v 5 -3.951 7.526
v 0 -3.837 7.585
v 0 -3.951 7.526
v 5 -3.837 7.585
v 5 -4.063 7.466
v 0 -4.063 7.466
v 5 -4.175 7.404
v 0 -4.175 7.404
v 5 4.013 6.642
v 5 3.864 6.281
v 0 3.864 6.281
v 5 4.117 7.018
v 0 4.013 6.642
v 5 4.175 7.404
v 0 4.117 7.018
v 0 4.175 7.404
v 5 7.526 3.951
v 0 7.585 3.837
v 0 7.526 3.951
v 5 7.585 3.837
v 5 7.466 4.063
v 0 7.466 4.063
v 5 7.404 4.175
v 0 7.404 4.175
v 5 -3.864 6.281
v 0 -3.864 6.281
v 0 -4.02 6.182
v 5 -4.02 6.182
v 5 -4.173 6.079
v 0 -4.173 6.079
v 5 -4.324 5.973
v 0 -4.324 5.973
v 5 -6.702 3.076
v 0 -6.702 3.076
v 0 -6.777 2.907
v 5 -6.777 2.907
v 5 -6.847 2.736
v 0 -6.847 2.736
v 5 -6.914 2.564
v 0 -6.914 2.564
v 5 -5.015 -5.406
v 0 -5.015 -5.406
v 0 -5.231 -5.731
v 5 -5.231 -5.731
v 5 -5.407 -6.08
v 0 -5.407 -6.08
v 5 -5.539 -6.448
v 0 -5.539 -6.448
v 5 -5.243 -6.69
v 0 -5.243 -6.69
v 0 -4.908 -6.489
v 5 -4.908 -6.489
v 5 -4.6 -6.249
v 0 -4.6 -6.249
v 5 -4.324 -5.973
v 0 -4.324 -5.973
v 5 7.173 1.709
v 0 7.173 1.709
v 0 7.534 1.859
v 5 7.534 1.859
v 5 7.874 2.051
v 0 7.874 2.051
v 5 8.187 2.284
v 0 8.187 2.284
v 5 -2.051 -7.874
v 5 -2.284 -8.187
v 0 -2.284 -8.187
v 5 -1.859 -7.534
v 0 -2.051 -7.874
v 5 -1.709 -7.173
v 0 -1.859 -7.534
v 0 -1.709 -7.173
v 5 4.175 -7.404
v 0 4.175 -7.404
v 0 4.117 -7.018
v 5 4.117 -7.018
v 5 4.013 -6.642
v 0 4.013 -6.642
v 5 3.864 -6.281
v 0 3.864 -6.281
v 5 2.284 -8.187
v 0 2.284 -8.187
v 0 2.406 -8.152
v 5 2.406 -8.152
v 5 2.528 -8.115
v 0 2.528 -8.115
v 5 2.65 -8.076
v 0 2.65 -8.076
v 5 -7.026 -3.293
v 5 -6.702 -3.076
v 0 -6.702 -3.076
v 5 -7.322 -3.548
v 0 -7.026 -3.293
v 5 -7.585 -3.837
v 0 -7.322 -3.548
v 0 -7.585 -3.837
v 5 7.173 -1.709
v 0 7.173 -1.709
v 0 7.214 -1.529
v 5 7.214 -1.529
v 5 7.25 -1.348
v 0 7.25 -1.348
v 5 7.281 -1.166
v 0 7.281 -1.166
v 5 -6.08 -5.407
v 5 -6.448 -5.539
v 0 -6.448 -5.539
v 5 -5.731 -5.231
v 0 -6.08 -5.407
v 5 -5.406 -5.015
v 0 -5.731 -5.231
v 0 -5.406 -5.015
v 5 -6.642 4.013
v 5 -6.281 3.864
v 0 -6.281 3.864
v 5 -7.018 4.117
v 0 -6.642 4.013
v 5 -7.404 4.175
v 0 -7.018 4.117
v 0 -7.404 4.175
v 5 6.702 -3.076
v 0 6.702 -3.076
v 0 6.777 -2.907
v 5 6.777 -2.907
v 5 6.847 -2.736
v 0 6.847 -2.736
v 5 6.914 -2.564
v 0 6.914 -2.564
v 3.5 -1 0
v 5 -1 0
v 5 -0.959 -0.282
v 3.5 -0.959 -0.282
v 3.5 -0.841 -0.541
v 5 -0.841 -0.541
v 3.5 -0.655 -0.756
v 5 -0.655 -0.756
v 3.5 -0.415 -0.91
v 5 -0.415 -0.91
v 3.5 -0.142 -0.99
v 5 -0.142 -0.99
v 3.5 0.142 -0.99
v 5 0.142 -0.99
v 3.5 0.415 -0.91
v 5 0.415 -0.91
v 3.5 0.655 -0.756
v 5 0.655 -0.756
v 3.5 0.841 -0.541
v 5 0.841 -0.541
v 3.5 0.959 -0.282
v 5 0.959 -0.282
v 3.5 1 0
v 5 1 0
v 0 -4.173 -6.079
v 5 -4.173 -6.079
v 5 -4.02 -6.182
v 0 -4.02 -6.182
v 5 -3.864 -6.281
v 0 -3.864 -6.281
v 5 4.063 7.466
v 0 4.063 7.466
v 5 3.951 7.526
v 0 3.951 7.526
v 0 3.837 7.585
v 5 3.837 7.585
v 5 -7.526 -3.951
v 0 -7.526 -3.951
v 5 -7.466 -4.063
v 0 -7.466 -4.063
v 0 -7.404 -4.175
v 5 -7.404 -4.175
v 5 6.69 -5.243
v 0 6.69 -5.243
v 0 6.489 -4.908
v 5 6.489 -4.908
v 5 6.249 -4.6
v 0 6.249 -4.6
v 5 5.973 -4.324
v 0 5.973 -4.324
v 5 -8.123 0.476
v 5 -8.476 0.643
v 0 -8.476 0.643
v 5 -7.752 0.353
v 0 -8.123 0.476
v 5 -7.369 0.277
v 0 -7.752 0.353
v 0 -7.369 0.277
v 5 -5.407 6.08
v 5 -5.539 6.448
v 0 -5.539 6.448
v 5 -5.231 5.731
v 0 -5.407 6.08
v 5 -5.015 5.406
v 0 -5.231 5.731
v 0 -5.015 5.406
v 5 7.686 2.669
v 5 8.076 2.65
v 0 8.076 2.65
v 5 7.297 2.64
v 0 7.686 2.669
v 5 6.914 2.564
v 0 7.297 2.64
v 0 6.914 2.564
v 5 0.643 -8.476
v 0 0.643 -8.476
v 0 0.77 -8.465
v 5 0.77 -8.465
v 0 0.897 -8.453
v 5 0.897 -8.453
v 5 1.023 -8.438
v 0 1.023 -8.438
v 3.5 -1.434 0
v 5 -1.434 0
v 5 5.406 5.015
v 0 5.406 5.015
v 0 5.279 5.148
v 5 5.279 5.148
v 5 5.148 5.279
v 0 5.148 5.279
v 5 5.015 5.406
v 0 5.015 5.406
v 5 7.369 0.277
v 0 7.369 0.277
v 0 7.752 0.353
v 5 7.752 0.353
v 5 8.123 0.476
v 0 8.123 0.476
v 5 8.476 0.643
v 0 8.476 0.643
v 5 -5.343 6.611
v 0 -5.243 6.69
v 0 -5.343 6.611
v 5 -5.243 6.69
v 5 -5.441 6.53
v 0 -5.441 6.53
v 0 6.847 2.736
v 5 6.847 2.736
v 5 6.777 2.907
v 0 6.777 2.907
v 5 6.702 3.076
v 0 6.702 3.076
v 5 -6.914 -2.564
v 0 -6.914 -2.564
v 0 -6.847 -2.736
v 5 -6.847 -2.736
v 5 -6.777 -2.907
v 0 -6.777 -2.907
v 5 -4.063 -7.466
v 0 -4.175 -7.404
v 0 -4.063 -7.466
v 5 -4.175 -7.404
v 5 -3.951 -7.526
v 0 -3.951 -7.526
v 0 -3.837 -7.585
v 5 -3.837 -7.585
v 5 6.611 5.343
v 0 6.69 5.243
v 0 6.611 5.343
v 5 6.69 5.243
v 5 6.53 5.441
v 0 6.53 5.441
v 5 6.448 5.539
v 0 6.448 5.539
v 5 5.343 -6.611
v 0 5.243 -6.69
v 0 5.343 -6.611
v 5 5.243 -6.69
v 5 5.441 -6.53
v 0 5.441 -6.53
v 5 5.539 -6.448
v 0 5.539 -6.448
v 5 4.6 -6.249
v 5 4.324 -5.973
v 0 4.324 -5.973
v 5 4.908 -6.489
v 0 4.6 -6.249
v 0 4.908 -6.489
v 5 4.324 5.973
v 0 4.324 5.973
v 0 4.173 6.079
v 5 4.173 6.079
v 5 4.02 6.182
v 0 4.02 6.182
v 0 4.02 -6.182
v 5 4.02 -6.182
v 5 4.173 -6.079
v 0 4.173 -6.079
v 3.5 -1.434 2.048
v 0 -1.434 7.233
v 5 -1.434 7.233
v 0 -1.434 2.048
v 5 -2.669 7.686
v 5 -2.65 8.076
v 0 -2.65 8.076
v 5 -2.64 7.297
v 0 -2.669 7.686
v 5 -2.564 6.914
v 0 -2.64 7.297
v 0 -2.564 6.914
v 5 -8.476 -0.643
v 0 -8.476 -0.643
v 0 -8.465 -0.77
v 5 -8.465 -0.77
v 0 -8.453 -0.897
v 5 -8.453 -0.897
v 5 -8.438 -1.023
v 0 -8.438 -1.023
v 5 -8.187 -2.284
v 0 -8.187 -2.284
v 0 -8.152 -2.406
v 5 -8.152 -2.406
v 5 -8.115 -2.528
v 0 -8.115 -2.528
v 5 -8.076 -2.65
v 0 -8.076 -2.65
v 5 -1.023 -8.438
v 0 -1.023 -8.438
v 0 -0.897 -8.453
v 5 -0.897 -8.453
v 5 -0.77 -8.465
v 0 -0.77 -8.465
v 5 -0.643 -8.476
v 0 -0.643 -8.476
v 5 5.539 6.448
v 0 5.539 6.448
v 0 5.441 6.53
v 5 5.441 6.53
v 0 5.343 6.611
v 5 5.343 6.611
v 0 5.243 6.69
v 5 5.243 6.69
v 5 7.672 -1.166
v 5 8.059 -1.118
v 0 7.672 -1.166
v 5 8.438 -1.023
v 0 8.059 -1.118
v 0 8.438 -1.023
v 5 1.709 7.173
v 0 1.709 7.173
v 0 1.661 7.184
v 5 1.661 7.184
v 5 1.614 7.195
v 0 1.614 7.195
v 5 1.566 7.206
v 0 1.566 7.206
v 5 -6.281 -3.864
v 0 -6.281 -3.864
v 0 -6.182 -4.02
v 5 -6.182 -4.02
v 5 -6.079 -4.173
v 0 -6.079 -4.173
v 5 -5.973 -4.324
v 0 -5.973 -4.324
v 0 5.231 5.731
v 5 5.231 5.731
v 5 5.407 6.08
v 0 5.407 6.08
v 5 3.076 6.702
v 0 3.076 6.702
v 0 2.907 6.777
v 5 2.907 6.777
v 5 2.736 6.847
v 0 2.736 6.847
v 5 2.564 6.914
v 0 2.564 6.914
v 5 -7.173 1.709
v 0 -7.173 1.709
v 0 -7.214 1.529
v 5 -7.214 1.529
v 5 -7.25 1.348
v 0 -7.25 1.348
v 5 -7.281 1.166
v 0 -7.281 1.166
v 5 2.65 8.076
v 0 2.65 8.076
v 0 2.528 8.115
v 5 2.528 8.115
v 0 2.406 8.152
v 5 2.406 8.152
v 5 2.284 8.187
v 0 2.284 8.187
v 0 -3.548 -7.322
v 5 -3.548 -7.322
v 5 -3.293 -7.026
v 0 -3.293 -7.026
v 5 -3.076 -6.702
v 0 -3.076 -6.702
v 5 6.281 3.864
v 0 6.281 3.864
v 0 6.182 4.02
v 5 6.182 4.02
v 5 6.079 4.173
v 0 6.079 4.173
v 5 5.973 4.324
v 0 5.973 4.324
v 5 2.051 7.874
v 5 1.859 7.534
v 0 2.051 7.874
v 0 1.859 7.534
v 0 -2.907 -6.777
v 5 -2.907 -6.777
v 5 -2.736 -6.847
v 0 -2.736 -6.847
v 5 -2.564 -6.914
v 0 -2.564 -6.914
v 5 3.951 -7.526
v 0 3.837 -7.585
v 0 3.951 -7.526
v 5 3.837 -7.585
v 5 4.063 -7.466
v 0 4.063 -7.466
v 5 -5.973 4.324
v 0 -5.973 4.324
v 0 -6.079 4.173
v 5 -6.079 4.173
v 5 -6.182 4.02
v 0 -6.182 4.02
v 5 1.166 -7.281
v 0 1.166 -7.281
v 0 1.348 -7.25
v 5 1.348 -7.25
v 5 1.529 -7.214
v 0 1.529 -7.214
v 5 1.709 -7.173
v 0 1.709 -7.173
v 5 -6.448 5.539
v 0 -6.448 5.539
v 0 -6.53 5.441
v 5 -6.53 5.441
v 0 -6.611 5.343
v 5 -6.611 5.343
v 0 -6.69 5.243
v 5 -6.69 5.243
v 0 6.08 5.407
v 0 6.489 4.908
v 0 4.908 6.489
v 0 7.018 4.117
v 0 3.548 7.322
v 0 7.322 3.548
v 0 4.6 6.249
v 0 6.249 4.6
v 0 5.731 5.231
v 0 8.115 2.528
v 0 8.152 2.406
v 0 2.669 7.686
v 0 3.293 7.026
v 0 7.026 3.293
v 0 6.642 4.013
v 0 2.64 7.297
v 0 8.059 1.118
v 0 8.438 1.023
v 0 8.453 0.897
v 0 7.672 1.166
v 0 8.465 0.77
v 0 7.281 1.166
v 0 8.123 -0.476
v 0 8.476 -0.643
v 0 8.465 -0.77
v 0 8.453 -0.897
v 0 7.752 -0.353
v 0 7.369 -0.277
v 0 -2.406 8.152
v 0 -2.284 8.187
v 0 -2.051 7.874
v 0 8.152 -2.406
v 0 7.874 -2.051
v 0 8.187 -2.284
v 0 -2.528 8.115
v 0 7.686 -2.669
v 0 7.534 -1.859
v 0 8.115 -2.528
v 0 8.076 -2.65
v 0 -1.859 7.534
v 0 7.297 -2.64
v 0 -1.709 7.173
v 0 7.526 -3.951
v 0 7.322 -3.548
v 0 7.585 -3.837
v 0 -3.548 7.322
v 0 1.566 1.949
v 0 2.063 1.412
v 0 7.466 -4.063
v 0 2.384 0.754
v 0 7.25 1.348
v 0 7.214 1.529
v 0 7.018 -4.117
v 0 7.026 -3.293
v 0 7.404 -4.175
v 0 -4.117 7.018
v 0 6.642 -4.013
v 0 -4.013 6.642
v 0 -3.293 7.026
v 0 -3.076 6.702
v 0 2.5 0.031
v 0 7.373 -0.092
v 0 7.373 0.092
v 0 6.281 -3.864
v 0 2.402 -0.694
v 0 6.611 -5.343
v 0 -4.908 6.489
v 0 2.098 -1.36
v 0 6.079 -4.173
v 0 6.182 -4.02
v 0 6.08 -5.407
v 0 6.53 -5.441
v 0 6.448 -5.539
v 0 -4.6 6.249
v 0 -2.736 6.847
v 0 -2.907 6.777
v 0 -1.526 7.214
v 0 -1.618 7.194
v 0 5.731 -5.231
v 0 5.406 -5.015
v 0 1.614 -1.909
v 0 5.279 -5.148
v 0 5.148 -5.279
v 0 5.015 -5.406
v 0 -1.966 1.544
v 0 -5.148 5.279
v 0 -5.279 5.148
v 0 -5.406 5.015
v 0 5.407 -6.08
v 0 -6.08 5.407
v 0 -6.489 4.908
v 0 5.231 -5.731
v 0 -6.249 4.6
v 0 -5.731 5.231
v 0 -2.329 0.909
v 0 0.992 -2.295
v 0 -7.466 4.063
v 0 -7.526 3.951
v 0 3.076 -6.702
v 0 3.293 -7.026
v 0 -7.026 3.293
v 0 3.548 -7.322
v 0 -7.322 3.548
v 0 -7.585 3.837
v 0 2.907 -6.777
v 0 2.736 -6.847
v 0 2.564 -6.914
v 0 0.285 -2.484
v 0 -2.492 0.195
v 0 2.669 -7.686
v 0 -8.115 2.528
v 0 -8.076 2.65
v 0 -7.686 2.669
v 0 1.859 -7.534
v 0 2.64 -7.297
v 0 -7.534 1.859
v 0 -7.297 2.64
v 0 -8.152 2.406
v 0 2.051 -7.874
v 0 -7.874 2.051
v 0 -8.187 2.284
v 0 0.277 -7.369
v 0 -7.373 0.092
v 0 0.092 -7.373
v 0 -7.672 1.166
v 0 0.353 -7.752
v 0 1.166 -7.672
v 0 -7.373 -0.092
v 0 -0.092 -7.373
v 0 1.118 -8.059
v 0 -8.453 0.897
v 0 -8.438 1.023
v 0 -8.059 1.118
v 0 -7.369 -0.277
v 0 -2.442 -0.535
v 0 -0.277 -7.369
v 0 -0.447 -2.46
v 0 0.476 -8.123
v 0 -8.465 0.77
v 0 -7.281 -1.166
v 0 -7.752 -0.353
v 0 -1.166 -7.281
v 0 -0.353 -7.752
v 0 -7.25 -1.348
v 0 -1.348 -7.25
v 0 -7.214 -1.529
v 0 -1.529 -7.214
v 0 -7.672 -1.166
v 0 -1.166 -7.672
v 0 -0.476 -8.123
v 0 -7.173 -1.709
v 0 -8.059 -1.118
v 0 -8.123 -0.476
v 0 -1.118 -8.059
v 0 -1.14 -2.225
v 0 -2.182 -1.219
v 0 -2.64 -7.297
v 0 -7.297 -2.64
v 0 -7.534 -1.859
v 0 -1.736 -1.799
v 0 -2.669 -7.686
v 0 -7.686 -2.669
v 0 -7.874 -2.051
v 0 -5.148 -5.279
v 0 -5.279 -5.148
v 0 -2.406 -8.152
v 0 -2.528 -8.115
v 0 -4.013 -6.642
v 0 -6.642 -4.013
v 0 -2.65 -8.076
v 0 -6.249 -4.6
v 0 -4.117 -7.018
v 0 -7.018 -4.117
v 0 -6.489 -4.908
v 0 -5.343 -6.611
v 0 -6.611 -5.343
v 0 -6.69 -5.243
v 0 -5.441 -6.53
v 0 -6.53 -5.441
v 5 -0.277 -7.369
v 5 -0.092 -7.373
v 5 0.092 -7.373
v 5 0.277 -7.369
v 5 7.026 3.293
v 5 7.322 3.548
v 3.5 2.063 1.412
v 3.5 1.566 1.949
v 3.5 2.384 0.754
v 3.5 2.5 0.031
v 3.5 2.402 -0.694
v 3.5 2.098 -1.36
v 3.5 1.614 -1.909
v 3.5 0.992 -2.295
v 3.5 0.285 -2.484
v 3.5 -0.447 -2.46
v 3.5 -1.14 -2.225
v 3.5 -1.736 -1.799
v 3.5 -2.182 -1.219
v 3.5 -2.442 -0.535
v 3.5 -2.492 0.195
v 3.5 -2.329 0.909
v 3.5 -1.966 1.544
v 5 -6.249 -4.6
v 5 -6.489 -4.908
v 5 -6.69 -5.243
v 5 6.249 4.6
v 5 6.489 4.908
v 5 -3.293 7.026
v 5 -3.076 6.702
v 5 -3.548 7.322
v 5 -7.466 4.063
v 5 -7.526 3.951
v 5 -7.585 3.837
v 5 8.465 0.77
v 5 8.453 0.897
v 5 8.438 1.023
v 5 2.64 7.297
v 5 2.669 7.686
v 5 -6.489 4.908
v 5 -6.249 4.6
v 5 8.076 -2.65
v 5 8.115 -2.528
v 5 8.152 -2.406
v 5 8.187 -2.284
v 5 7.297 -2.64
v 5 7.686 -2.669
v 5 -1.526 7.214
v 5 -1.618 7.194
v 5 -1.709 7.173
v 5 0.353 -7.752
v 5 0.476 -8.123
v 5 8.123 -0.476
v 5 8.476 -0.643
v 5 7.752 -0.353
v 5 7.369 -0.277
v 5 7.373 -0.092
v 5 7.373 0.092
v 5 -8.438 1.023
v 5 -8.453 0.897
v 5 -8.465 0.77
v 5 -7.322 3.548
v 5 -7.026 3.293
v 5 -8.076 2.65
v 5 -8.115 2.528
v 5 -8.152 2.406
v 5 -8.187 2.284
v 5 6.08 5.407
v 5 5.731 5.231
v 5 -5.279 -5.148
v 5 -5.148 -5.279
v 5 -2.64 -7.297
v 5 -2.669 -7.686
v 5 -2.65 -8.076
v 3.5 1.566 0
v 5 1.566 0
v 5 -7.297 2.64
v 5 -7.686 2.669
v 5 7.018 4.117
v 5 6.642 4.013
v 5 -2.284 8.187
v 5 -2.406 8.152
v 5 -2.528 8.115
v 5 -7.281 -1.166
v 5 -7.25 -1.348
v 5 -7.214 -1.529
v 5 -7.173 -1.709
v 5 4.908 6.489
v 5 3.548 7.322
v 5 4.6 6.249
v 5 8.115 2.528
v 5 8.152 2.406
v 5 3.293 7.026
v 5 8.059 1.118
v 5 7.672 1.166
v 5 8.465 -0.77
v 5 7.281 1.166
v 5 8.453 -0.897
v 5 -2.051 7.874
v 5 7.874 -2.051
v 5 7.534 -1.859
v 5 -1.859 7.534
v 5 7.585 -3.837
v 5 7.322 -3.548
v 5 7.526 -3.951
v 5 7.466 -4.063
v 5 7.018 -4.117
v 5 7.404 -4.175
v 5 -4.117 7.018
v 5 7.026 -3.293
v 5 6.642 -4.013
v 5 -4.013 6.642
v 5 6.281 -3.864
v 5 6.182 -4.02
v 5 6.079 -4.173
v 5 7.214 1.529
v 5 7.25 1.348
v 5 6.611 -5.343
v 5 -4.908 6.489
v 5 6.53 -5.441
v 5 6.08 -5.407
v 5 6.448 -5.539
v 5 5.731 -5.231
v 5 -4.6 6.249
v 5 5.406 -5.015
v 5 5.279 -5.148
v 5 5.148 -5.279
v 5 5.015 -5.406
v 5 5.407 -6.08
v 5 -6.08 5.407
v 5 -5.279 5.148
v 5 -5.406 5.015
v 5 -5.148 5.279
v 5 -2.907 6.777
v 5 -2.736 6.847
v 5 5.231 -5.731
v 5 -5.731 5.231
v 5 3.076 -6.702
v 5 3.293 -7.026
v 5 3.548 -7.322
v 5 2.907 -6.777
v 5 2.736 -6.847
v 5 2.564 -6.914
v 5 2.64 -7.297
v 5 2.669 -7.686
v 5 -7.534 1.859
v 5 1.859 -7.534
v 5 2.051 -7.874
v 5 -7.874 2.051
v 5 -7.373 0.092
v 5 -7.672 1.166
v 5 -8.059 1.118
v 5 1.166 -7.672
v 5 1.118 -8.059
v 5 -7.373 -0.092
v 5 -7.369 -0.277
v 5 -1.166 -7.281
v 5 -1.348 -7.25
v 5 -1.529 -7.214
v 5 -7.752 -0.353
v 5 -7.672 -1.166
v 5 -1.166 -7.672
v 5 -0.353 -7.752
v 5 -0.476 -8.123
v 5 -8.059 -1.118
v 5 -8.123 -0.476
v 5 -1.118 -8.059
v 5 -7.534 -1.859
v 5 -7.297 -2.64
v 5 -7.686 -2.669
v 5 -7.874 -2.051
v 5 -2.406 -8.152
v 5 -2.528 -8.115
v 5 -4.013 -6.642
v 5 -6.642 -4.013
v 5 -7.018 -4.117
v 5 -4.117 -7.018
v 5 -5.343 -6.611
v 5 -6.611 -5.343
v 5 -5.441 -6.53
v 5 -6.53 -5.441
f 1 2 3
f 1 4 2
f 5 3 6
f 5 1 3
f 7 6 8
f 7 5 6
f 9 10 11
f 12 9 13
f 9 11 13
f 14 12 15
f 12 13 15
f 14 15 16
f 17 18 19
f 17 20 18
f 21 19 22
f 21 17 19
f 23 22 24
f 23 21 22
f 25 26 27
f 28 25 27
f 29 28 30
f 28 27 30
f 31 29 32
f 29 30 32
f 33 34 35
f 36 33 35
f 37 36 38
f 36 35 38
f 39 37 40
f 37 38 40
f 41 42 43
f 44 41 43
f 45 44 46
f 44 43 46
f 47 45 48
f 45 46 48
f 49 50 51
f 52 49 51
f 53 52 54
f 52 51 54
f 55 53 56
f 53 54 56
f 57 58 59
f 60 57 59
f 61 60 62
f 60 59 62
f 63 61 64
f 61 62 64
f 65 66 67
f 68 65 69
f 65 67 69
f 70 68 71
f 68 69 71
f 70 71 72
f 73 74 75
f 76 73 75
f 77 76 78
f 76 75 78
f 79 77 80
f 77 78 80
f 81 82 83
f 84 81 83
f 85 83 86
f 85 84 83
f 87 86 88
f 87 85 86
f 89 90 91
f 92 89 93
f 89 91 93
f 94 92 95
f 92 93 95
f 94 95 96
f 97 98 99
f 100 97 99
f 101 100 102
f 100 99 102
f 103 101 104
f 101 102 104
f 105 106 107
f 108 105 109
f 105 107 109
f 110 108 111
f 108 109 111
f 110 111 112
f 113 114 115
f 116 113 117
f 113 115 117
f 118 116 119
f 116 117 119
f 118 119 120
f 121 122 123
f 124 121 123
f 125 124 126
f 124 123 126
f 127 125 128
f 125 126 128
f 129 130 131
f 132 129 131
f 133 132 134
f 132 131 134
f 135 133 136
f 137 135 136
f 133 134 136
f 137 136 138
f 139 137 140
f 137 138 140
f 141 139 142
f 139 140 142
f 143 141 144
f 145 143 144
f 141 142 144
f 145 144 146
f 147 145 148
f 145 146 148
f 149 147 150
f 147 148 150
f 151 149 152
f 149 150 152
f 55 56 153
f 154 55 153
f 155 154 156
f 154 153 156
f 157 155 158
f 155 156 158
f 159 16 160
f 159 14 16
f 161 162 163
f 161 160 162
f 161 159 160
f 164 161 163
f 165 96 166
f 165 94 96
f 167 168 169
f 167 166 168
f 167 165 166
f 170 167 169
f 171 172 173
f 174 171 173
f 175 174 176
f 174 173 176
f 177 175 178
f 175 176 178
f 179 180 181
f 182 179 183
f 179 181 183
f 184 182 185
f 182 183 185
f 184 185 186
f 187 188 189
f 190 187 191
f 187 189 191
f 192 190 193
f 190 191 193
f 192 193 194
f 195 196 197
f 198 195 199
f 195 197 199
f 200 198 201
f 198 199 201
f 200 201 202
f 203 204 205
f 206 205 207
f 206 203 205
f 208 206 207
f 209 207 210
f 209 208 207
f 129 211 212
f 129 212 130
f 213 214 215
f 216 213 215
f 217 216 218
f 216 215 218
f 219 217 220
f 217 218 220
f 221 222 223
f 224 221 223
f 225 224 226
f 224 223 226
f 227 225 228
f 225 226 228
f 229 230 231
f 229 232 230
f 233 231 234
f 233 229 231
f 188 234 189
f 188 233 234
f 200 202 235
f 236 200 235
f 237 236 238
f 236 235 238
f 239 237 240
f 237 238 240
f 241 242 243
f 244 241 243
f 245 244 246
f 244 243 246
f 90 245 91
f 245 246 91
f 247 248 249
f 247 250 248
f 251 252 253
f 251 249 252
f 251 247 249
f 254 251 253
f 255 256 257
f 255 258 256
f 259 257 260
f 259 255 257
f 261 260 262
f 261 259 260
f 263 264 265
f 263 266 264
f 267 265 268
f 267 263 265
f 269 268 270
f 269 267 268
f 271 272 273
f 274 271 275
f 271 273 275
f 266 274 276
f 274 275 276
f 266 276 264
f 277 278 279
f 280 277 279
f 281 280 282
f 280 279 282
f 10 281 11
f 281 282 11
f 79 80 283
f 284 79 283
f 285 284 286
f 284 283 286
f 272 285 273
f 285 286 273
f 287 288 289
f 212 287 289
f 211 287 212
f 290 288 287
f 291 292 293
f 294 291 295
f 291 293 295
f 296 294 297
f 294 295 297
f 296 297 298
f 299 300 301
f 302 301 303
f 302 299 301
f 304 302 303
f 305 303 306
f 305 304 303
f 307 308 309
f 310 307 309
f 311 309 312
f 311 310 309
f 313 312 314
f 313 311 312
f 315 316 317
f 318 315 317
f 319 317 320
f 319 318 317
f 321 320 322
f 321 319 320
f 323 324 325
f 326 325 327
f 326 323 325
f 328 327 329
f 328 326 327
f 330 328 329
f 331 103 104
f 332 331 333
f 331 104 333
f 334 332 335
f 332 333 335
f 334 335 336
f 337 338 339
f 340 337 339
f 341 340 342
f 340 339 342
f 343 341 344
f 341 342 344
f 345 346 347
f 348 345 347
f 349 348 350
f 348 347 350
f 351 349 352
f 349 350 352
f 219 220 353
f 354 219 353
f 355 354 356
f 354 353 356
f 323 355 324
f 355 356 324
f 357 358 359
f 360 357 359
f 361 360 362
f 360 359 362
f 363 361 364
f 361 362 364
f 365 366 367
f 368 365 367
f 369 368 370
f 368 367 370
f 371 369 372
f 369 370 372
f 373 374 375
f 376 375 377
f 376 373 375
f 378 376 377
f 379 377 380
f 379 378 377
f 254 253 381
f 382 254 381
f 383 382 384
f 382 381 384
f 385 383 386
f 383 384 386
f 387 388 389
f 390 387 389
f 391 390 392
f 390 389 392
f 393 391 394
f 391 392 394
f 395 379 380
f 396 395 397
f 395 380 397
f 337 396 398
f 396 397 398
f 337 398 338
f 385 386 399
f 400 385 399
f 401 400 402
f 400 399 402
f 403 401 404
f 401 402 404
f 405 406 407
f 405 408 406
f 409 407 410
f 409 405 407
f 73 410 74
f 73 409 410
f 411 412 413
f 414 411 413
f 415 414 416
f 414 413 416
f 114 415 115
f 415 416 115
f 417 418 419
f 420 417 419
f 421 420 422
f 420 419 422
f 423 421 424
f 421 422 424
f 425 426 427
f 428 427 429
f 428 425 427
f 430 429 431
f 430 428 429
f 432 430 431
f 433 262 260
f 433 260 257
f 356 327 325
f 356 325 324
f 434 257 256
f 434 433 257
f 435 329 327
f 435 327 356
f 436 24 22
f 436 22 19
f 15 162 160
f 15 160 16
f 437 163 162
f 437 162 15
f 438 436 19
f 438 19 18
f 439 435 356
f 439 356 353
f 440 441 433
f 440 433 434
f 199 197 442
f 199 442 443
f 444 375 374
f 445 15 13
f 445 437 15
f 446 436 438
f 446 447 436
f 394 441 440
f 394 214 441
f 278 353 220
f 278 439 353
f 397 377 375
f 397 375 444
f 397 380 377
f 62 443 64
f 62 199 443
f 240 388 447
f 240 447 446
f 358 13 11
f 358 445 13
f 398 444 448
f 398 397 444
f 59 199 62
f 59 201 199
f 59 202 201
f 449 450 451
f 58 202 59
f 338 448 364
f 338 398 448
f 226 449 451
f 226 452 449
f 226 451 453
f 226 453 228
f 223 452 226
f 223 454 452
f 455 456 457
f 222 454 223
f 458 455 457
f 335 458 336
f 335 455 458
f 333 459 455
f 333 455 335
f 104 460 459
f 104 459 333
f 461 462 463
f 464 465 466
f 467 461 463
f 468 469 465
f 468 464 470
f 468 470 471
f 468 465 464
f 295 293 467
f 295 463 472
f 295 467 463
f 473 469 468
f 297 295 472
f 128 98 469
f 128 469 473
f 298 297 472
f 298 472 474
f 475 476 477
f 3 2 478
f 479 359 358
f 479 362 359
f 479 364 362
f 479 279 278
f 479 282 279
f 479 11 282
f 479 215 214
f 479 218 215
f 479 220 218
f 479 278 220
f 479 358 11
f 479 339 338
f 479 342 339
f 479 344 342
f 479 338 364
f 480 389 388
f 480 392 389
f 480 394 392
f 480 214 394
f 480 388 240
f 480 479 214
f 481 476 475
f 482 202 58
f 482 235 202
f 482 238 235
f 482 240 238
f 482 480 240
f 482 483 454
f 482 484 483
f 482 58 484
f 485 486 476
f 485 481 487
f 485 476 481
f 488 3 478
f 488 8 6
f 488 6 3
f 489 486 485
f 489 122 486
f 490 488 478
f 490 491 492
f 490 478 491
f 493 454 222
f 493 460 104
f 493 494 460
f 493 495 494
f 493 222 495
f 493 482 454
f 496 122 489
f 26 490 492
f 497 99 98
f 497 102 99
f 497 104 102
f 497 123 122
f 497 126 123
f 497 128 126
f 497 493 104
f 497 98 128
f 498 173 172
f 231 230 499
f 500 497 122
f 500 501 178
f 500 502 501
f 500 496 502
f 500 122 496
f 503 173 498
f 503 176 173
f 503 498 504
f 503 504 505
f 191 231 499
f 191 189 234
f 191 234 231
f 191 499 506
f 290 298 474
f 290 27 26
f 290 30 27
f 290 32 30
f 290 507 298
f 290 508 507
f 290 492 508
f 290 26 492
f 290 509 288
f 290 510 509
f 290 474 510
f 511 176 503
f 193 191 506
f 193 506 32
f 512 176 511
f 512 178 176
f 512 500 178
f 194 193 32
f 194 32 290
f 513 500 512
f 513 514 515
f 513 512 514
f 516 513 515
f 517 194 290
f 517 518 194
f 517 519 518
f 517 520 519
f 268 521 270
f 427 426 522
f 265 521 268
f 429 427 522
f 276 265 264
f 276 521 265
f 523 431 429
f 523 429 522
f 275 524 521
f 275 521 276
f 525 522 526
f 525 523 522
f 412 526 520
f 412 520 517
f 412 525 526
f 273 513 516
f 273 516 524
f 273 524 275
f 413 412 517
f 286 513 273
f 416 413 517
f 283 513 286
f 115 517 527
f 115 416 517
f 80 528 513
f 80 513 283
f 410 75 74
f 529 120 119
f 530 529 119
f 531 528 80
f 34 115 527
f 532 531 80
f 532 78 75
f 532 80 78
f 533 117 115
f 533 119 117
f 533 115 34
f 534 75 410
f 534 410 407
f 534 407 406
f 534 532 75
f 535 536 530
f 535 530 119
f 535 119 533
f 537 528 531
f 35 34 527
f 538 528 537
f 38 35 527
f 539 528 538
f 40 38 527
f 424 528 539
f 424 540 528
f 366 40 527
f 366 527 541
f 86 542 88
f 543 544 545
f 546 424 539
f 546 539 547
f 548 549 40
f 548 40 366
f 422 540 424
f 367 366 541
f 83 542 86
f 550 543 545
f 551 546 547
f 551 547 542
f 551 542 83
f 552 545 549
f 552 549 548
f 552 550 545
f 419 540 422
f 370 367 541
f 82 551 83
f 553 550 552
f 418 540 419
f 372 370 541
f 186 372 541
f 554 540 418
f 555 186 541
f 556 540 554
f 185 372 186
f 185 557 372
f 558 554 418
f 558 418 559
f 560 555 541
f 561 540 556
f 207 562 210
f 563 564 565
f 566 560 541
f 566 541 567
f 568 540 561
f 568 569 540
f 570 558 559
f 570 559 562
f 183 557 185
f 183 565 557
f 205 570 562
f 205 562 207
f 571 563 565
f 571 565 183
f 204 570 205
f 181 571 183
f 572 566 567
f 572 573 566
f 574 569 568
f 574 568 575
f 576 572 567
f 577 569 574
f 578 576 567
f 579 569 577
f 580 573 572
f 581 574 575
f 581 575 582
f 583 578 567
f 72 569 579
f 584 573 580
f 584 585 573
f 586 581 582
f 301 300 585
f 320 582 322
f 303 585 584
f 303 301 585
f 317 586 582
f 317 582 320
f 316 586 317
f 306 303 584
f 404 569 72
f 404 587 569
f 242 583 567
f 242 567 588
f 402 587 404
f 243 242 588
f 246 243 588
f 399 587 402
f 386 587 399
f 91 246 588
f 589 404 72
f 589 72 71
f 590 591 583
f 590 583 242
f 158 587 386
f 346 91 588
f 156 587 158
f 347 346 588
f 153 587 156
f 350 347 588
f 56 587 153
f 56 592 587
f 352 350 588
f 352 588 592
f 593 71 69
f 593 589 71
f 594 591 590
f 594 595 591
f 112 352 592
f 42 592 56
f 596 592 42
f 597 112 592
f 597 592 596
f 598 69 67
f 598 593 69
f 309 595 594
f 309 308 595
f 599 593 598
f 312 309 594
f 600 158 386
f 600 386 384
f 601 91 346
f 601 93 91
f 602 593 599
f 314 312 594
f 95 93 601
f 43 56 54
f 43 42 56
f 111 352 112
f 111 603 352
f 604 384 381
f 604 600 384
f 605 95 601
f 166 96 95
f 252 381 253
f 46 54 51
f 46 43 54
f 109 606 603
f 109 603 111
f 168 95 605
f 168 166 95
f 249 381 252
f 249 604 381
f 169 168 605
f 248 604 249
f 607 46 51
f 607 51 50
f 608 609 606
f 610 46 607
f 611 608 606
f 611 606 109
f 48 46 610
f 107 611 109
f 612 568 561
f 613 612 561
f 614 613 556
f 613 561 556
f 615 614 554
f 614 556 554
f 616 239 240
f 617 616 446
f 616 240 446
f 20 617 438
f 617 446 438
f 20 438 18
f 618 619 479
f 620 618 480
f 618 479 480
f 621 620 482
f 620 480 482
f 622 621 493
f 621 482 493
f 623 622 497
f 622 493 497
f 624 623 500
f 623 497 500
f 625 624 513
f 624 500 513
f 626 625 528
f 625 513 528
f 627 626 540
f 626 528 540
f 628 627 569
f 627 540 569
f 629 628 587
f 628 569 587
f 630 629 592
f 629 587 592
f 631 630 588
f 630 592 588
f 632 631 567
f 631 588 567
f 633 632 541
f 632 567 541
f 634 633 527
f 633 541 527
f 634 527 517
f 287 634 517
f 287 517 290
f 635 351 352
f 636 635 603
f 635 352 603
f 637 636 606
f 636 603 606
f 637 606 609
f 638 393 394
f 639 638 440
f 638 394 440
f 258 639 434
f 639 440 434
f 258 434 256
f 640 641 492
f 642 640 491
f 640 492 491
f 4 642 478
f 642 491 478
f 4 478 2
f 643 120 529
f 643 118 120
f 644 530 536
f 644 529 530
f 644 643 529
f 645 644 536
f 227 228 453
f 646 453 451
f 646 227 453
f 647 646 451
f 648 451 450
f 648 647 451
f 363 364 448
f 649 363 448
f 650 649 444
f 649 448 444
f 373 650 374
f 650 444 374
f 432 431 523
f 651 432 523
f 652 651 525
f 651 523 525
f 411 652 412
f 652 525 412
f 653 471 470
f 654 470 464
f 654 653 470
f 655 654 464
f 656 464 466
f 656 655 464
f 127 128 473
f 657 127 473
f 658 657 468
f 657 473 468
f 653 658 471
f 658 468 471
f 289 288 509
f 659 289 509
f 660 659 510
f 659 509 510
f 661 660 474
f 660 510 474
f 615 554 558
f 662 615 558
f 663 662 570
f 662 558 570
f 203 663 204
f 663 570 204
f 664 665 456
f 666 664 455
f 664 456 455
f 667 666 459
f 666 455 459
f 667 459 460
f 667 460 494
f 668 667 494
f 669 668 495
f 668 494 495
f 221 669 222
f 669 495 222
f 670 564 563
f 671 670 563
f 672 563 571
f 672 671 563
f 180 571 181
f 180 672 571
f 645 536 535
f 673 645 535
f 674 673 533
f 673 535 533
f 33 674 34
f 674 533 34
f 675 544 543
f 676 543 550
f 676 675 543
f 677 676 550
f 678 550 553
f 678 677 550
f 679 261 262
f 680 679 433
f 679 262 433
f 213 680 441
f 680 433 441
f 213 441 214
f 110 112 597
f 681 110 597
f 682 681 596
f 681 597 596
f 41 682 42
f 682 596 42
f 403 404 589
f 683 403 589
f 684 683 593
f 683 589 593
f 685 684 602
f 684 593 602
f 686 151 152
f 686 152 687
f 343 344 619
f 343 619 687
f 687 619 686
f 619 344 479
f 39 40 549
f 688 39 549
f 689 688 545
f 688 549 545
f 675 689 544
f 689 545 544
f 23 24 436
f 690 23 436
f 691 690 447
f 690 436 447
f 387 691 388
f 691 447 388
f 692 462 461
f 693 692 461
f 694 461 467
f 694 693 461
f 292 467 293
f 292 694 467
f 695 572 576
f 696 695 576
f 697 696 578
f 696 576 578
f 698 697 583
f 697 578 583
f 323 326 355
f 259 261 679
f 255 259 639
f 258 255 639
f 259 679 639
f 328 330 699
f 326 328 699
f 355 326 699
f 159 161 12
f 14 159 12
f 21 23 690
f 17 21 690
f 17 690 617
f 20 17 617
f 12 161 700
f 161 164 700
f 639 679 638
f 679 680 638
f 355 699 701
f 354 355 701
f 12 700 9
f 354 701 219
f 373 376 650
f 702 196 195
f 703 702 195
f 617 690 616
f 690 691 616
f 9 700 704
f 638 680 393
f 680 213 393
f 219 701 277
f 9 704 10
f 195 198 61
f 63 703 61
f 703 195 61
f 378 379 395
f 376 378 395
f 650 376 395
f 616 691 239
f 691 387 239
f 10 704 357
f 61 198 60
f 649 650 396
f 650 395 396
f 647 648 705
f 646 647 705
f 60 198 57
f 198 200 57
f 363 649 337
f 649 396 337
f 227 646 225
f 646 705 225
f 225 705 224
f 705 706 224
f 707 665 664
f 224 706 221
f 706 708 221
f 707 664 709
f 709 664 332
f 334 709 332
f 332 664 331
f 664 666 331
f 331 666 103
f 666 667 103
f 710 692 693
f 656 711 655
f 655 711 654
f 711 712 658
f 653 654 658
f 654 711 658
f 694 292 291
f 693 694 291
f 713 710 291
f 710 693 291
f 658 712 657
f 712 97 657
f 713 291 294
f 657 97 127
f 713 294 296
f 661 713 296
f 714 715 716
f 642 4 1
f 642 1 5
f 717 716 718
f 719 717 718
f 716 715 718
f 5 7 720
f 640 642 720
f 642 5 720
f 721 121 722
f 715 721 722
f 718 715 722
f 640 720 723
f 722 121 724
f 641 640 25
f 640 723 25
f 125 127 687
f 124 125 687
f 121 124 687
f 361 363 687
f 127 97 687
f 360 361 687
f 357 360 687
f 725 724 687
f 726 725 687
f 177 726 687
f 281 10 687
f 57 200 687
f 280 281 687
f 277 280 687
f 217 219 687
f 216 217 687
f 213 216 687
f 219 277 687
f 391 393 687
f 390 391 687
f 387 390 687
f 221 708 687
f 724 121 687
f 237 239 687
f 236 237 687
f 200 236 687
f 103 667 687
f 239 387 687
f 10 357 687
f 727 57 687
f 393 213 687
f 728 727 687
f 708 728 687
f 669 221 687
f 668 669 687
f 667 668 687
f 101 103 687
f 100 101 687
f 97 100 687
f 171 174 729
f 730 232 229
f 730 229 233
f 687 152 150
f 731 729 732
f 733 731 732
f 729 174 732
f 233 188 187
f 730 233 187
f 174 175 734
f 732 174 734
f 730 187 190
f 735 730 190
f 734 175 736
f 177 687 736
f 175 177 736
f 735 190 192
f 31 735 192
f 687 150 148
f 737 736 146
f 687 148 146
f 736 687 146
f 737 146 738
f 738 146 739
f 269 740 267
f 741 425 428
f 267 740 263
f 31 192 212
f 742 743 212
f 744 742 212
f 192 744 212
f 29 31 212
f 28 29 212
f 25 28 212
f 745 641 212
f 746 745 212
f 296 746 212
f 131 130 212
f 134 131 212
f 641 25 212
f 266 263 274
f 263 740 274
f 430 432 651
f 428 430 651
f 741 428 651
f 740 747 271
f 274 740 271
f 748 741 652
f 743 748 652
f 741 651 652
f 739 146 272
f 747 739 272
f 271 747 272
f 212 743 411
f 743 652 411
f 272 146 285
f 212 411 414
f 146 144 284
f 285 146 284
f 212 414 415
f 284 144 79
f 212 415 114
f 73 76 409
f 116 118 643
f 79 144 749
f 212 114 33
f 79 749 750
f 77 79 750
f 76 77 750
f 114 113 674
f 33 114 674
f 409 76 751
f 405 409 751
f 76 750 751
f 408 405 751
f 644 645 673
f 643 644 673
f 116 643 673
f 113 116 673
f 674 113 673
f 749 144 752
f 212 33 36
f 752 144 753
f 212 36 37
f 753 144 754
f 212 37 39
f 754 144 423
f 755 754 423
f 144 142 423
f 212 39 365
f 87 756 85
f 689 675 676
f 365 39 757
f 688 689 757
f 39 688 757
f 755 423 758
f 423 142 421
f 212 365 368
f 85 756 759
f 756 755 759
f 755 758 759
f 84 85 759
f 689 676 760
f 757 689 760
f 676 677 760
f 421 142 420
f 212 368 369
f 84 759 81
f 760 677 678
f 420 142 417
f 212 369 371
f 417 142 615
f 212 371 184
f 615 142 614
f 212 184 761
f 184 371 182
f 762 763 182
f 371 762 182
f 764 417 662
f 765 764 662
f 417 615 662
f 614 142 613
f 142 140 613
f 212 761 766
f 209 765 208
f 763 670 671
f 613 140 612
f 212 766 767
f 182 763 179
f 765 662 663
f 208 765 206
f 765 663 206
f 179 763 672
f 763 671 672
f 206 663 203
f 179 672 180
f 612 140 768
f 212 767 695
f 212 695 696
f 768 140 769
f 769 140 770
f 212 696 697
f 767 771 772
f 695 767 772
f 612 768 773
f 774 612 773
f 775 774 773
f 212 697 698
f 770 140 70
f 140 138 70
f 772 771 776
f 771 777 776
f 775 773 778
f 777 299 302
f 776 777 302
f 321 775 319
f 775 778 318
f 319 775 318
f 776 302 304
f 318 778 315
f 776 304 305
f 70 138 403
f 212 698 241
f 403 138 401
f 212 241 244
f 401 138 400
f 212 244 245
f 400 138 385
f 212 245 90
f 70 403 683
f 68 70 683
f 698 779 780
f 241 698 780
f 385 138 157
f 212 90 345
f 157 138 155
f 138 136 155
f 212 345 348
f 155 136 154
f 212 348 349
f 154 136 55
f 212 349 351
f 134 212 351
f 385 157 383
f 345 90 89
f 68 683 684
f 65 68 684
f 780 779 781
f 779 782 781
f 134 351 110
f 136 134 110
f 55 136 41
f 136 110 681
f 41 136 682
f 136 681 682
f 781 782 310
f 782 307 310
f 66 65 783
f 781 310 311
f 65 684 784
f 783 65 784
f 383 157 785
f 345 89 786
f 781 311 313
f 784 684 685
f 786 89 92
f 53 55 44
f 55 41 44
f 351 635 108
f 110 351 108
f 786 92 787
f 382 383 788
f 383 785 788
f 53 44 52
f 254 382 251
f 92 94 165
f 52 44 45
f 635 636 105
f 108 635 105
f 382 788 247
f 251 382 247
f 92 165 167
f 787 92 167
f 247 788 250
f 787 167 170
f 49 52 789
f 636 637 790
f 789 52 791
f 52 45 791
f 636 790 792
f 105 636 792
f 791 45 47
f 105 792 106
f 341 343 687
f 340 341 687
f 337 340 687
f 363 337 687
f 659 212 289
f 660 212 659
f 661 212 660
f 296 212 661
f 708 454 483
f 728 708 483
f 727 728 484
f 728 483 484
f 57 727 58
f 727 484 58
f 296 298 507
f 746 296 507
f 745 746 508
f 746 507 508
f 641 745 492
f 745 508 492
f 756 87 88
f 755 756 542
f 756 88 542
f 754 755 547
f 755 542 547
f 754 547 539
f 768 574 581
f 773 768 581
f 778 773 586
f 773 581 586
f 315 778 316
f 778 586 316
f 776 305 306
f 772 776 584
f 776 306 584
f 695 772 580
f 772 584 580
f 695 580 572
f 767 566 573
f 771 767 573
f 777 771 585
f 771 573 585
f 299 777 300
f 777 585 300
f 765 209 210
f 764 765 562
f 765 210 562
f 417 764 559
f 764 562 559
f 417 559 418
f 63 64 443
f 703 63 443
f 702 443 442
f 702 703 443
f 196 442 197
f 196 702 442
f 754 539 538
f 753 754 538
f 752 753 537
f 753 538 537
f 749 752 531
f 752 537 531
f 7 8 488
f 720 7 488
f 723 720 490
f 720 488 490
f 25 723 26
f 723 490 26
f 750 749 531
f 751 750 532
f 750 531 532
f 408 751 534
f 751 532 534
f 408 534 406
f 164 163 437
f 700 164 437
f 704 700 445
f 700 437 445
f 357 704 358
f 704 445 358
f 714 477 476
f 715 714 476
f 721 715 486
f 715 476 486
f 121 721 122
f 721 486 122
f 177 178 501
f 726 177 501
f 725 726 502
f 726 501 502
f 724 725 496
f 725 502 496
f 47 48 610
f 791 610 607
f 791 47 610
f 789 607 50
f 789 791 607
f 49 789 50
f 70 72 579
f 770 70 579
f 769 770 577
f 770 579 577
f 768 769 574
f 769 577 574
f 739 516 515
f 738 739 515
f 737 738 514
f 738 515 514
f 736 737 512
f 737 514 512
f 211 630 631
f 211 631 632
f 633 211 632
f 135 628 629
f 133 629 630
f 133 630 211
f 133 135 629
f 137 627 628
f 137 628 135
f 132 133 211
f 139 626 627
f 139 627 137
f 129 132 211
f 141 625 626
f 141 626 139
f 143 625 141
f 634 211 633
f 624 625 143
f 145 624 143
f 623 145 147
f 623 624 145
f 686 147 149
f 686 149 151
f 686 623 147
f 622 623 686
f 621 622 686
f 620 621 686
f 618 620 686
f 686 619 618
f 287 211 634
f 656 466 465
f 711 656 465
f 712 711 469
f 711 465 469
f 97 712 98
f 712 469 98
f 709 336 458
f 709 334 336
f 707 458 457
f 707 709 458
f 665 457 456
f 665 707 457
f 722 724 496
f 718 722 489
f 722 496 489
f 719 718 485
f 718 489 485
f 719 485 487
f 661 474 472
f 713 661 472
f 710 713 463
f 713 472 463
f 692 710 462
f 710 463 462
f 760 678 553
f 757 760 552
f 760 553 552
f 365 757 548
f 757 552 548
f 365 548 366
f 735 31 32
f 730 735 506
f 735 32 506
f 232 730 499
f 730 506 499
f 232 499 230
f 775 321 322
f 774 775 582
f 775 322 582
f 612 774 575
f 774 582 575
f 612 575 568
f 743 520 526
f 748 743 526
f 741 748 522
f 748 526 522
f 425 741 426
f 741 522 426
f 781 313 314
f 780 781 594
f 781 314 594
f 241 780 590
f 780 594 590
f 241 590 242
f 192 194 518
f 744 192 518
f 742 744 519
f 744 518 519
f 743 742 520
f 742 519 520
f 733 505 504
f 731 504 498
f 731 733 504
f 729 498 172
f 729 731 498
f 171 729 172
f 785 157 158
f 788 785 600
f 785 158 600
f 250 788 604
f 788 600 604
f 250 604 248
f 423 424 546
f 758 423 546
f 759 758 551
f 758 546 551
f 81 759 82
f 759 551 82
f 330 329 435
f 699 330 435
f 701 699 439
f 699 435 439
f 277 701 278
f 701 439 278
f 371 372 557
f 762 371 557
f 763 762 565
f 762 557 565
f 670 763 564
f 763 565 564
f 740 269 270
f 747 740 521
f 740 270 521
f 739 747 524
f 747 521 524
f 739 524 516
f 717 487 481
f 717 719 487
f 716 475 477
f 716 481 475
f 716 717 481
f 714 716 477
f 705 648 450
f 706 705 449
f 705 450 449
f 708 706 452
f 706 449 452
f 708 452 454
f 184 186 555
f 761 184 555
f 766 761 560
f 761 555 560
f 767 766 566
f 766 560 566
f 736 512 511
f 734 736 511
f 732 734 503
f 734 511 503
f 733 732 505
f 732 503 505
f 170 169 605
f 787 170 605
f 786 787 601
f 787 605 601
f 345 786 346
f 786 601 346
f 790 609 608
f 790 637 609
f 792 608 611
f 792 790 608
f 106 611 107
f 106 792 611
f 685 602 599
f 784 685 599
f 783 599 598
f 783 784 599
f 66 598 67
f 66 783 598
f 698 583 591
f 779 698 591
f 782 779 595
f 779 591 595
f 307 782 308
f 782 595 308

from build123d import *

# Parameters (mm, degrees)
BASPROSKE_W             = 5
BASPROSKE_H             = 8.5
TOOTHCUT_DEPTH          = 14.019216566
TEETHCUTS_COUNT         = 32
TEETHCUTS_ANGLE         = 348.75
BORSKE_R                = 1
BORE_DEPTH              = 50.0000508
CUT_EXTRUDE1_DEPTH      = 13.987467398
CUT_EXTRUDE1_DEPTH_BACK = 13.987467398
SKETCH1_W               = 10
SKETCH1_H               = 3
SKETCH2_R               = 2.5
CUT_EXTRUDE2_DEPTH      = 3.5


with BuildPart() as part:
    # BasProSke → Base-Revolve (revolve)
    with BuildSketch(Plane(origin=(0, 0, 0), x_dir=(1, 0, 0), z_dir=(0, 1, 0)), mode=Mode.PRIVATE) as base_revolve_sk:
        with Locations((2.5, 4.25)):
            Rectangle(BASPROSKE_W, BASPROSKE_H)
    revolve(base_revolve_sk.sketch.rotate(Axis((-10, 0, 0), (1, 0, 0)), 180), axis=Axis((-10, 0, 0), (1, 0, 0)))

    # TooCutSke → ToothCut (cut, through all)
    with BuildSketch(Plane(origin=(0, 0, 0), x_dir=(0, 0, -1), z_dir=(1, 0, 0))):
        with BuildLine():
            ThreePointArc((0.277002447, 7.3687954), (0, 7.374), (-0.277002447, 7.3687954))
            ThreePointArc((-0.277002447, 7.3687954), (-0.41335061, 7.952280695), (-0.656086882, 8.500117362))
            ThreePointArc((-0.656086882, 8.500117362), (0, 8.5254), (0.656086882, 8.500117362))
            ThreePointArc((0.656086882, 8.500117362), (0.41335061, 7.952280695), (0.277002447, 7.3687954))
        make_face()
    toothcut = extrude(amount=TOOTHCUT_DEPTH, mode=Mode.SUBTRACT)

    # TeethCuts: ToothCut ×32 about axis
    teethcuts_axis = Axis((-10, 0, 0), (1, 0, 0))
    for i in range(1, TEETHCUTS_COUNT):
        add(toothcut.rotate(teethcuts_axis, i * TEETHCUTS_ANGLE / (TEETHCUTS_COUNT - 1)), mode=Mode.SUBTRACT)

    # BorSke → Bore (cut, symmetric)
    with BuildSketch(Plane(origin=(0, 0, 0), x_dir=(0, 0, -1), z_dir=(1, 0, 0))):
        with Locations(Location((0, 0, 0), (0, 0, 180))):
            Circle(BORSKE_R)
    extrude(amount=BORE_DEPTH, both=True, mode=Mode.SUBTRACT)

    # Sketch1 → Cut-Extrude1 (cut, two sides: drawn at the far end of the back side and taken through both)
    with BuildSketch(Plane(origin=(5, 0, 0), x_dir=(0, 0, -1), z_dir=(1, 0, 0)).offset(-CUT_EXTRUDE1_DEPTH_BACK)):
        with Locations((-5, 0.065617364)):
            Rectangle(SKETCH1_W, SKETCH1_H)
    extrude(amount=CUT_EXTRUDE1_DEPTH + CUT_EXTRUDE1_DEPTH_BACK, mode=Mode.SUBTRACT)

    # Sketch2 → Cut-Extrude2 (cut)
    with BuildSketch(Plane.ZY):
        Circle(SKETCH2_R)
    extrude(amount=-CUT_EXTRUDE2_DEPTH, mode=Mode.SUBTRACT)


solid = part.part
